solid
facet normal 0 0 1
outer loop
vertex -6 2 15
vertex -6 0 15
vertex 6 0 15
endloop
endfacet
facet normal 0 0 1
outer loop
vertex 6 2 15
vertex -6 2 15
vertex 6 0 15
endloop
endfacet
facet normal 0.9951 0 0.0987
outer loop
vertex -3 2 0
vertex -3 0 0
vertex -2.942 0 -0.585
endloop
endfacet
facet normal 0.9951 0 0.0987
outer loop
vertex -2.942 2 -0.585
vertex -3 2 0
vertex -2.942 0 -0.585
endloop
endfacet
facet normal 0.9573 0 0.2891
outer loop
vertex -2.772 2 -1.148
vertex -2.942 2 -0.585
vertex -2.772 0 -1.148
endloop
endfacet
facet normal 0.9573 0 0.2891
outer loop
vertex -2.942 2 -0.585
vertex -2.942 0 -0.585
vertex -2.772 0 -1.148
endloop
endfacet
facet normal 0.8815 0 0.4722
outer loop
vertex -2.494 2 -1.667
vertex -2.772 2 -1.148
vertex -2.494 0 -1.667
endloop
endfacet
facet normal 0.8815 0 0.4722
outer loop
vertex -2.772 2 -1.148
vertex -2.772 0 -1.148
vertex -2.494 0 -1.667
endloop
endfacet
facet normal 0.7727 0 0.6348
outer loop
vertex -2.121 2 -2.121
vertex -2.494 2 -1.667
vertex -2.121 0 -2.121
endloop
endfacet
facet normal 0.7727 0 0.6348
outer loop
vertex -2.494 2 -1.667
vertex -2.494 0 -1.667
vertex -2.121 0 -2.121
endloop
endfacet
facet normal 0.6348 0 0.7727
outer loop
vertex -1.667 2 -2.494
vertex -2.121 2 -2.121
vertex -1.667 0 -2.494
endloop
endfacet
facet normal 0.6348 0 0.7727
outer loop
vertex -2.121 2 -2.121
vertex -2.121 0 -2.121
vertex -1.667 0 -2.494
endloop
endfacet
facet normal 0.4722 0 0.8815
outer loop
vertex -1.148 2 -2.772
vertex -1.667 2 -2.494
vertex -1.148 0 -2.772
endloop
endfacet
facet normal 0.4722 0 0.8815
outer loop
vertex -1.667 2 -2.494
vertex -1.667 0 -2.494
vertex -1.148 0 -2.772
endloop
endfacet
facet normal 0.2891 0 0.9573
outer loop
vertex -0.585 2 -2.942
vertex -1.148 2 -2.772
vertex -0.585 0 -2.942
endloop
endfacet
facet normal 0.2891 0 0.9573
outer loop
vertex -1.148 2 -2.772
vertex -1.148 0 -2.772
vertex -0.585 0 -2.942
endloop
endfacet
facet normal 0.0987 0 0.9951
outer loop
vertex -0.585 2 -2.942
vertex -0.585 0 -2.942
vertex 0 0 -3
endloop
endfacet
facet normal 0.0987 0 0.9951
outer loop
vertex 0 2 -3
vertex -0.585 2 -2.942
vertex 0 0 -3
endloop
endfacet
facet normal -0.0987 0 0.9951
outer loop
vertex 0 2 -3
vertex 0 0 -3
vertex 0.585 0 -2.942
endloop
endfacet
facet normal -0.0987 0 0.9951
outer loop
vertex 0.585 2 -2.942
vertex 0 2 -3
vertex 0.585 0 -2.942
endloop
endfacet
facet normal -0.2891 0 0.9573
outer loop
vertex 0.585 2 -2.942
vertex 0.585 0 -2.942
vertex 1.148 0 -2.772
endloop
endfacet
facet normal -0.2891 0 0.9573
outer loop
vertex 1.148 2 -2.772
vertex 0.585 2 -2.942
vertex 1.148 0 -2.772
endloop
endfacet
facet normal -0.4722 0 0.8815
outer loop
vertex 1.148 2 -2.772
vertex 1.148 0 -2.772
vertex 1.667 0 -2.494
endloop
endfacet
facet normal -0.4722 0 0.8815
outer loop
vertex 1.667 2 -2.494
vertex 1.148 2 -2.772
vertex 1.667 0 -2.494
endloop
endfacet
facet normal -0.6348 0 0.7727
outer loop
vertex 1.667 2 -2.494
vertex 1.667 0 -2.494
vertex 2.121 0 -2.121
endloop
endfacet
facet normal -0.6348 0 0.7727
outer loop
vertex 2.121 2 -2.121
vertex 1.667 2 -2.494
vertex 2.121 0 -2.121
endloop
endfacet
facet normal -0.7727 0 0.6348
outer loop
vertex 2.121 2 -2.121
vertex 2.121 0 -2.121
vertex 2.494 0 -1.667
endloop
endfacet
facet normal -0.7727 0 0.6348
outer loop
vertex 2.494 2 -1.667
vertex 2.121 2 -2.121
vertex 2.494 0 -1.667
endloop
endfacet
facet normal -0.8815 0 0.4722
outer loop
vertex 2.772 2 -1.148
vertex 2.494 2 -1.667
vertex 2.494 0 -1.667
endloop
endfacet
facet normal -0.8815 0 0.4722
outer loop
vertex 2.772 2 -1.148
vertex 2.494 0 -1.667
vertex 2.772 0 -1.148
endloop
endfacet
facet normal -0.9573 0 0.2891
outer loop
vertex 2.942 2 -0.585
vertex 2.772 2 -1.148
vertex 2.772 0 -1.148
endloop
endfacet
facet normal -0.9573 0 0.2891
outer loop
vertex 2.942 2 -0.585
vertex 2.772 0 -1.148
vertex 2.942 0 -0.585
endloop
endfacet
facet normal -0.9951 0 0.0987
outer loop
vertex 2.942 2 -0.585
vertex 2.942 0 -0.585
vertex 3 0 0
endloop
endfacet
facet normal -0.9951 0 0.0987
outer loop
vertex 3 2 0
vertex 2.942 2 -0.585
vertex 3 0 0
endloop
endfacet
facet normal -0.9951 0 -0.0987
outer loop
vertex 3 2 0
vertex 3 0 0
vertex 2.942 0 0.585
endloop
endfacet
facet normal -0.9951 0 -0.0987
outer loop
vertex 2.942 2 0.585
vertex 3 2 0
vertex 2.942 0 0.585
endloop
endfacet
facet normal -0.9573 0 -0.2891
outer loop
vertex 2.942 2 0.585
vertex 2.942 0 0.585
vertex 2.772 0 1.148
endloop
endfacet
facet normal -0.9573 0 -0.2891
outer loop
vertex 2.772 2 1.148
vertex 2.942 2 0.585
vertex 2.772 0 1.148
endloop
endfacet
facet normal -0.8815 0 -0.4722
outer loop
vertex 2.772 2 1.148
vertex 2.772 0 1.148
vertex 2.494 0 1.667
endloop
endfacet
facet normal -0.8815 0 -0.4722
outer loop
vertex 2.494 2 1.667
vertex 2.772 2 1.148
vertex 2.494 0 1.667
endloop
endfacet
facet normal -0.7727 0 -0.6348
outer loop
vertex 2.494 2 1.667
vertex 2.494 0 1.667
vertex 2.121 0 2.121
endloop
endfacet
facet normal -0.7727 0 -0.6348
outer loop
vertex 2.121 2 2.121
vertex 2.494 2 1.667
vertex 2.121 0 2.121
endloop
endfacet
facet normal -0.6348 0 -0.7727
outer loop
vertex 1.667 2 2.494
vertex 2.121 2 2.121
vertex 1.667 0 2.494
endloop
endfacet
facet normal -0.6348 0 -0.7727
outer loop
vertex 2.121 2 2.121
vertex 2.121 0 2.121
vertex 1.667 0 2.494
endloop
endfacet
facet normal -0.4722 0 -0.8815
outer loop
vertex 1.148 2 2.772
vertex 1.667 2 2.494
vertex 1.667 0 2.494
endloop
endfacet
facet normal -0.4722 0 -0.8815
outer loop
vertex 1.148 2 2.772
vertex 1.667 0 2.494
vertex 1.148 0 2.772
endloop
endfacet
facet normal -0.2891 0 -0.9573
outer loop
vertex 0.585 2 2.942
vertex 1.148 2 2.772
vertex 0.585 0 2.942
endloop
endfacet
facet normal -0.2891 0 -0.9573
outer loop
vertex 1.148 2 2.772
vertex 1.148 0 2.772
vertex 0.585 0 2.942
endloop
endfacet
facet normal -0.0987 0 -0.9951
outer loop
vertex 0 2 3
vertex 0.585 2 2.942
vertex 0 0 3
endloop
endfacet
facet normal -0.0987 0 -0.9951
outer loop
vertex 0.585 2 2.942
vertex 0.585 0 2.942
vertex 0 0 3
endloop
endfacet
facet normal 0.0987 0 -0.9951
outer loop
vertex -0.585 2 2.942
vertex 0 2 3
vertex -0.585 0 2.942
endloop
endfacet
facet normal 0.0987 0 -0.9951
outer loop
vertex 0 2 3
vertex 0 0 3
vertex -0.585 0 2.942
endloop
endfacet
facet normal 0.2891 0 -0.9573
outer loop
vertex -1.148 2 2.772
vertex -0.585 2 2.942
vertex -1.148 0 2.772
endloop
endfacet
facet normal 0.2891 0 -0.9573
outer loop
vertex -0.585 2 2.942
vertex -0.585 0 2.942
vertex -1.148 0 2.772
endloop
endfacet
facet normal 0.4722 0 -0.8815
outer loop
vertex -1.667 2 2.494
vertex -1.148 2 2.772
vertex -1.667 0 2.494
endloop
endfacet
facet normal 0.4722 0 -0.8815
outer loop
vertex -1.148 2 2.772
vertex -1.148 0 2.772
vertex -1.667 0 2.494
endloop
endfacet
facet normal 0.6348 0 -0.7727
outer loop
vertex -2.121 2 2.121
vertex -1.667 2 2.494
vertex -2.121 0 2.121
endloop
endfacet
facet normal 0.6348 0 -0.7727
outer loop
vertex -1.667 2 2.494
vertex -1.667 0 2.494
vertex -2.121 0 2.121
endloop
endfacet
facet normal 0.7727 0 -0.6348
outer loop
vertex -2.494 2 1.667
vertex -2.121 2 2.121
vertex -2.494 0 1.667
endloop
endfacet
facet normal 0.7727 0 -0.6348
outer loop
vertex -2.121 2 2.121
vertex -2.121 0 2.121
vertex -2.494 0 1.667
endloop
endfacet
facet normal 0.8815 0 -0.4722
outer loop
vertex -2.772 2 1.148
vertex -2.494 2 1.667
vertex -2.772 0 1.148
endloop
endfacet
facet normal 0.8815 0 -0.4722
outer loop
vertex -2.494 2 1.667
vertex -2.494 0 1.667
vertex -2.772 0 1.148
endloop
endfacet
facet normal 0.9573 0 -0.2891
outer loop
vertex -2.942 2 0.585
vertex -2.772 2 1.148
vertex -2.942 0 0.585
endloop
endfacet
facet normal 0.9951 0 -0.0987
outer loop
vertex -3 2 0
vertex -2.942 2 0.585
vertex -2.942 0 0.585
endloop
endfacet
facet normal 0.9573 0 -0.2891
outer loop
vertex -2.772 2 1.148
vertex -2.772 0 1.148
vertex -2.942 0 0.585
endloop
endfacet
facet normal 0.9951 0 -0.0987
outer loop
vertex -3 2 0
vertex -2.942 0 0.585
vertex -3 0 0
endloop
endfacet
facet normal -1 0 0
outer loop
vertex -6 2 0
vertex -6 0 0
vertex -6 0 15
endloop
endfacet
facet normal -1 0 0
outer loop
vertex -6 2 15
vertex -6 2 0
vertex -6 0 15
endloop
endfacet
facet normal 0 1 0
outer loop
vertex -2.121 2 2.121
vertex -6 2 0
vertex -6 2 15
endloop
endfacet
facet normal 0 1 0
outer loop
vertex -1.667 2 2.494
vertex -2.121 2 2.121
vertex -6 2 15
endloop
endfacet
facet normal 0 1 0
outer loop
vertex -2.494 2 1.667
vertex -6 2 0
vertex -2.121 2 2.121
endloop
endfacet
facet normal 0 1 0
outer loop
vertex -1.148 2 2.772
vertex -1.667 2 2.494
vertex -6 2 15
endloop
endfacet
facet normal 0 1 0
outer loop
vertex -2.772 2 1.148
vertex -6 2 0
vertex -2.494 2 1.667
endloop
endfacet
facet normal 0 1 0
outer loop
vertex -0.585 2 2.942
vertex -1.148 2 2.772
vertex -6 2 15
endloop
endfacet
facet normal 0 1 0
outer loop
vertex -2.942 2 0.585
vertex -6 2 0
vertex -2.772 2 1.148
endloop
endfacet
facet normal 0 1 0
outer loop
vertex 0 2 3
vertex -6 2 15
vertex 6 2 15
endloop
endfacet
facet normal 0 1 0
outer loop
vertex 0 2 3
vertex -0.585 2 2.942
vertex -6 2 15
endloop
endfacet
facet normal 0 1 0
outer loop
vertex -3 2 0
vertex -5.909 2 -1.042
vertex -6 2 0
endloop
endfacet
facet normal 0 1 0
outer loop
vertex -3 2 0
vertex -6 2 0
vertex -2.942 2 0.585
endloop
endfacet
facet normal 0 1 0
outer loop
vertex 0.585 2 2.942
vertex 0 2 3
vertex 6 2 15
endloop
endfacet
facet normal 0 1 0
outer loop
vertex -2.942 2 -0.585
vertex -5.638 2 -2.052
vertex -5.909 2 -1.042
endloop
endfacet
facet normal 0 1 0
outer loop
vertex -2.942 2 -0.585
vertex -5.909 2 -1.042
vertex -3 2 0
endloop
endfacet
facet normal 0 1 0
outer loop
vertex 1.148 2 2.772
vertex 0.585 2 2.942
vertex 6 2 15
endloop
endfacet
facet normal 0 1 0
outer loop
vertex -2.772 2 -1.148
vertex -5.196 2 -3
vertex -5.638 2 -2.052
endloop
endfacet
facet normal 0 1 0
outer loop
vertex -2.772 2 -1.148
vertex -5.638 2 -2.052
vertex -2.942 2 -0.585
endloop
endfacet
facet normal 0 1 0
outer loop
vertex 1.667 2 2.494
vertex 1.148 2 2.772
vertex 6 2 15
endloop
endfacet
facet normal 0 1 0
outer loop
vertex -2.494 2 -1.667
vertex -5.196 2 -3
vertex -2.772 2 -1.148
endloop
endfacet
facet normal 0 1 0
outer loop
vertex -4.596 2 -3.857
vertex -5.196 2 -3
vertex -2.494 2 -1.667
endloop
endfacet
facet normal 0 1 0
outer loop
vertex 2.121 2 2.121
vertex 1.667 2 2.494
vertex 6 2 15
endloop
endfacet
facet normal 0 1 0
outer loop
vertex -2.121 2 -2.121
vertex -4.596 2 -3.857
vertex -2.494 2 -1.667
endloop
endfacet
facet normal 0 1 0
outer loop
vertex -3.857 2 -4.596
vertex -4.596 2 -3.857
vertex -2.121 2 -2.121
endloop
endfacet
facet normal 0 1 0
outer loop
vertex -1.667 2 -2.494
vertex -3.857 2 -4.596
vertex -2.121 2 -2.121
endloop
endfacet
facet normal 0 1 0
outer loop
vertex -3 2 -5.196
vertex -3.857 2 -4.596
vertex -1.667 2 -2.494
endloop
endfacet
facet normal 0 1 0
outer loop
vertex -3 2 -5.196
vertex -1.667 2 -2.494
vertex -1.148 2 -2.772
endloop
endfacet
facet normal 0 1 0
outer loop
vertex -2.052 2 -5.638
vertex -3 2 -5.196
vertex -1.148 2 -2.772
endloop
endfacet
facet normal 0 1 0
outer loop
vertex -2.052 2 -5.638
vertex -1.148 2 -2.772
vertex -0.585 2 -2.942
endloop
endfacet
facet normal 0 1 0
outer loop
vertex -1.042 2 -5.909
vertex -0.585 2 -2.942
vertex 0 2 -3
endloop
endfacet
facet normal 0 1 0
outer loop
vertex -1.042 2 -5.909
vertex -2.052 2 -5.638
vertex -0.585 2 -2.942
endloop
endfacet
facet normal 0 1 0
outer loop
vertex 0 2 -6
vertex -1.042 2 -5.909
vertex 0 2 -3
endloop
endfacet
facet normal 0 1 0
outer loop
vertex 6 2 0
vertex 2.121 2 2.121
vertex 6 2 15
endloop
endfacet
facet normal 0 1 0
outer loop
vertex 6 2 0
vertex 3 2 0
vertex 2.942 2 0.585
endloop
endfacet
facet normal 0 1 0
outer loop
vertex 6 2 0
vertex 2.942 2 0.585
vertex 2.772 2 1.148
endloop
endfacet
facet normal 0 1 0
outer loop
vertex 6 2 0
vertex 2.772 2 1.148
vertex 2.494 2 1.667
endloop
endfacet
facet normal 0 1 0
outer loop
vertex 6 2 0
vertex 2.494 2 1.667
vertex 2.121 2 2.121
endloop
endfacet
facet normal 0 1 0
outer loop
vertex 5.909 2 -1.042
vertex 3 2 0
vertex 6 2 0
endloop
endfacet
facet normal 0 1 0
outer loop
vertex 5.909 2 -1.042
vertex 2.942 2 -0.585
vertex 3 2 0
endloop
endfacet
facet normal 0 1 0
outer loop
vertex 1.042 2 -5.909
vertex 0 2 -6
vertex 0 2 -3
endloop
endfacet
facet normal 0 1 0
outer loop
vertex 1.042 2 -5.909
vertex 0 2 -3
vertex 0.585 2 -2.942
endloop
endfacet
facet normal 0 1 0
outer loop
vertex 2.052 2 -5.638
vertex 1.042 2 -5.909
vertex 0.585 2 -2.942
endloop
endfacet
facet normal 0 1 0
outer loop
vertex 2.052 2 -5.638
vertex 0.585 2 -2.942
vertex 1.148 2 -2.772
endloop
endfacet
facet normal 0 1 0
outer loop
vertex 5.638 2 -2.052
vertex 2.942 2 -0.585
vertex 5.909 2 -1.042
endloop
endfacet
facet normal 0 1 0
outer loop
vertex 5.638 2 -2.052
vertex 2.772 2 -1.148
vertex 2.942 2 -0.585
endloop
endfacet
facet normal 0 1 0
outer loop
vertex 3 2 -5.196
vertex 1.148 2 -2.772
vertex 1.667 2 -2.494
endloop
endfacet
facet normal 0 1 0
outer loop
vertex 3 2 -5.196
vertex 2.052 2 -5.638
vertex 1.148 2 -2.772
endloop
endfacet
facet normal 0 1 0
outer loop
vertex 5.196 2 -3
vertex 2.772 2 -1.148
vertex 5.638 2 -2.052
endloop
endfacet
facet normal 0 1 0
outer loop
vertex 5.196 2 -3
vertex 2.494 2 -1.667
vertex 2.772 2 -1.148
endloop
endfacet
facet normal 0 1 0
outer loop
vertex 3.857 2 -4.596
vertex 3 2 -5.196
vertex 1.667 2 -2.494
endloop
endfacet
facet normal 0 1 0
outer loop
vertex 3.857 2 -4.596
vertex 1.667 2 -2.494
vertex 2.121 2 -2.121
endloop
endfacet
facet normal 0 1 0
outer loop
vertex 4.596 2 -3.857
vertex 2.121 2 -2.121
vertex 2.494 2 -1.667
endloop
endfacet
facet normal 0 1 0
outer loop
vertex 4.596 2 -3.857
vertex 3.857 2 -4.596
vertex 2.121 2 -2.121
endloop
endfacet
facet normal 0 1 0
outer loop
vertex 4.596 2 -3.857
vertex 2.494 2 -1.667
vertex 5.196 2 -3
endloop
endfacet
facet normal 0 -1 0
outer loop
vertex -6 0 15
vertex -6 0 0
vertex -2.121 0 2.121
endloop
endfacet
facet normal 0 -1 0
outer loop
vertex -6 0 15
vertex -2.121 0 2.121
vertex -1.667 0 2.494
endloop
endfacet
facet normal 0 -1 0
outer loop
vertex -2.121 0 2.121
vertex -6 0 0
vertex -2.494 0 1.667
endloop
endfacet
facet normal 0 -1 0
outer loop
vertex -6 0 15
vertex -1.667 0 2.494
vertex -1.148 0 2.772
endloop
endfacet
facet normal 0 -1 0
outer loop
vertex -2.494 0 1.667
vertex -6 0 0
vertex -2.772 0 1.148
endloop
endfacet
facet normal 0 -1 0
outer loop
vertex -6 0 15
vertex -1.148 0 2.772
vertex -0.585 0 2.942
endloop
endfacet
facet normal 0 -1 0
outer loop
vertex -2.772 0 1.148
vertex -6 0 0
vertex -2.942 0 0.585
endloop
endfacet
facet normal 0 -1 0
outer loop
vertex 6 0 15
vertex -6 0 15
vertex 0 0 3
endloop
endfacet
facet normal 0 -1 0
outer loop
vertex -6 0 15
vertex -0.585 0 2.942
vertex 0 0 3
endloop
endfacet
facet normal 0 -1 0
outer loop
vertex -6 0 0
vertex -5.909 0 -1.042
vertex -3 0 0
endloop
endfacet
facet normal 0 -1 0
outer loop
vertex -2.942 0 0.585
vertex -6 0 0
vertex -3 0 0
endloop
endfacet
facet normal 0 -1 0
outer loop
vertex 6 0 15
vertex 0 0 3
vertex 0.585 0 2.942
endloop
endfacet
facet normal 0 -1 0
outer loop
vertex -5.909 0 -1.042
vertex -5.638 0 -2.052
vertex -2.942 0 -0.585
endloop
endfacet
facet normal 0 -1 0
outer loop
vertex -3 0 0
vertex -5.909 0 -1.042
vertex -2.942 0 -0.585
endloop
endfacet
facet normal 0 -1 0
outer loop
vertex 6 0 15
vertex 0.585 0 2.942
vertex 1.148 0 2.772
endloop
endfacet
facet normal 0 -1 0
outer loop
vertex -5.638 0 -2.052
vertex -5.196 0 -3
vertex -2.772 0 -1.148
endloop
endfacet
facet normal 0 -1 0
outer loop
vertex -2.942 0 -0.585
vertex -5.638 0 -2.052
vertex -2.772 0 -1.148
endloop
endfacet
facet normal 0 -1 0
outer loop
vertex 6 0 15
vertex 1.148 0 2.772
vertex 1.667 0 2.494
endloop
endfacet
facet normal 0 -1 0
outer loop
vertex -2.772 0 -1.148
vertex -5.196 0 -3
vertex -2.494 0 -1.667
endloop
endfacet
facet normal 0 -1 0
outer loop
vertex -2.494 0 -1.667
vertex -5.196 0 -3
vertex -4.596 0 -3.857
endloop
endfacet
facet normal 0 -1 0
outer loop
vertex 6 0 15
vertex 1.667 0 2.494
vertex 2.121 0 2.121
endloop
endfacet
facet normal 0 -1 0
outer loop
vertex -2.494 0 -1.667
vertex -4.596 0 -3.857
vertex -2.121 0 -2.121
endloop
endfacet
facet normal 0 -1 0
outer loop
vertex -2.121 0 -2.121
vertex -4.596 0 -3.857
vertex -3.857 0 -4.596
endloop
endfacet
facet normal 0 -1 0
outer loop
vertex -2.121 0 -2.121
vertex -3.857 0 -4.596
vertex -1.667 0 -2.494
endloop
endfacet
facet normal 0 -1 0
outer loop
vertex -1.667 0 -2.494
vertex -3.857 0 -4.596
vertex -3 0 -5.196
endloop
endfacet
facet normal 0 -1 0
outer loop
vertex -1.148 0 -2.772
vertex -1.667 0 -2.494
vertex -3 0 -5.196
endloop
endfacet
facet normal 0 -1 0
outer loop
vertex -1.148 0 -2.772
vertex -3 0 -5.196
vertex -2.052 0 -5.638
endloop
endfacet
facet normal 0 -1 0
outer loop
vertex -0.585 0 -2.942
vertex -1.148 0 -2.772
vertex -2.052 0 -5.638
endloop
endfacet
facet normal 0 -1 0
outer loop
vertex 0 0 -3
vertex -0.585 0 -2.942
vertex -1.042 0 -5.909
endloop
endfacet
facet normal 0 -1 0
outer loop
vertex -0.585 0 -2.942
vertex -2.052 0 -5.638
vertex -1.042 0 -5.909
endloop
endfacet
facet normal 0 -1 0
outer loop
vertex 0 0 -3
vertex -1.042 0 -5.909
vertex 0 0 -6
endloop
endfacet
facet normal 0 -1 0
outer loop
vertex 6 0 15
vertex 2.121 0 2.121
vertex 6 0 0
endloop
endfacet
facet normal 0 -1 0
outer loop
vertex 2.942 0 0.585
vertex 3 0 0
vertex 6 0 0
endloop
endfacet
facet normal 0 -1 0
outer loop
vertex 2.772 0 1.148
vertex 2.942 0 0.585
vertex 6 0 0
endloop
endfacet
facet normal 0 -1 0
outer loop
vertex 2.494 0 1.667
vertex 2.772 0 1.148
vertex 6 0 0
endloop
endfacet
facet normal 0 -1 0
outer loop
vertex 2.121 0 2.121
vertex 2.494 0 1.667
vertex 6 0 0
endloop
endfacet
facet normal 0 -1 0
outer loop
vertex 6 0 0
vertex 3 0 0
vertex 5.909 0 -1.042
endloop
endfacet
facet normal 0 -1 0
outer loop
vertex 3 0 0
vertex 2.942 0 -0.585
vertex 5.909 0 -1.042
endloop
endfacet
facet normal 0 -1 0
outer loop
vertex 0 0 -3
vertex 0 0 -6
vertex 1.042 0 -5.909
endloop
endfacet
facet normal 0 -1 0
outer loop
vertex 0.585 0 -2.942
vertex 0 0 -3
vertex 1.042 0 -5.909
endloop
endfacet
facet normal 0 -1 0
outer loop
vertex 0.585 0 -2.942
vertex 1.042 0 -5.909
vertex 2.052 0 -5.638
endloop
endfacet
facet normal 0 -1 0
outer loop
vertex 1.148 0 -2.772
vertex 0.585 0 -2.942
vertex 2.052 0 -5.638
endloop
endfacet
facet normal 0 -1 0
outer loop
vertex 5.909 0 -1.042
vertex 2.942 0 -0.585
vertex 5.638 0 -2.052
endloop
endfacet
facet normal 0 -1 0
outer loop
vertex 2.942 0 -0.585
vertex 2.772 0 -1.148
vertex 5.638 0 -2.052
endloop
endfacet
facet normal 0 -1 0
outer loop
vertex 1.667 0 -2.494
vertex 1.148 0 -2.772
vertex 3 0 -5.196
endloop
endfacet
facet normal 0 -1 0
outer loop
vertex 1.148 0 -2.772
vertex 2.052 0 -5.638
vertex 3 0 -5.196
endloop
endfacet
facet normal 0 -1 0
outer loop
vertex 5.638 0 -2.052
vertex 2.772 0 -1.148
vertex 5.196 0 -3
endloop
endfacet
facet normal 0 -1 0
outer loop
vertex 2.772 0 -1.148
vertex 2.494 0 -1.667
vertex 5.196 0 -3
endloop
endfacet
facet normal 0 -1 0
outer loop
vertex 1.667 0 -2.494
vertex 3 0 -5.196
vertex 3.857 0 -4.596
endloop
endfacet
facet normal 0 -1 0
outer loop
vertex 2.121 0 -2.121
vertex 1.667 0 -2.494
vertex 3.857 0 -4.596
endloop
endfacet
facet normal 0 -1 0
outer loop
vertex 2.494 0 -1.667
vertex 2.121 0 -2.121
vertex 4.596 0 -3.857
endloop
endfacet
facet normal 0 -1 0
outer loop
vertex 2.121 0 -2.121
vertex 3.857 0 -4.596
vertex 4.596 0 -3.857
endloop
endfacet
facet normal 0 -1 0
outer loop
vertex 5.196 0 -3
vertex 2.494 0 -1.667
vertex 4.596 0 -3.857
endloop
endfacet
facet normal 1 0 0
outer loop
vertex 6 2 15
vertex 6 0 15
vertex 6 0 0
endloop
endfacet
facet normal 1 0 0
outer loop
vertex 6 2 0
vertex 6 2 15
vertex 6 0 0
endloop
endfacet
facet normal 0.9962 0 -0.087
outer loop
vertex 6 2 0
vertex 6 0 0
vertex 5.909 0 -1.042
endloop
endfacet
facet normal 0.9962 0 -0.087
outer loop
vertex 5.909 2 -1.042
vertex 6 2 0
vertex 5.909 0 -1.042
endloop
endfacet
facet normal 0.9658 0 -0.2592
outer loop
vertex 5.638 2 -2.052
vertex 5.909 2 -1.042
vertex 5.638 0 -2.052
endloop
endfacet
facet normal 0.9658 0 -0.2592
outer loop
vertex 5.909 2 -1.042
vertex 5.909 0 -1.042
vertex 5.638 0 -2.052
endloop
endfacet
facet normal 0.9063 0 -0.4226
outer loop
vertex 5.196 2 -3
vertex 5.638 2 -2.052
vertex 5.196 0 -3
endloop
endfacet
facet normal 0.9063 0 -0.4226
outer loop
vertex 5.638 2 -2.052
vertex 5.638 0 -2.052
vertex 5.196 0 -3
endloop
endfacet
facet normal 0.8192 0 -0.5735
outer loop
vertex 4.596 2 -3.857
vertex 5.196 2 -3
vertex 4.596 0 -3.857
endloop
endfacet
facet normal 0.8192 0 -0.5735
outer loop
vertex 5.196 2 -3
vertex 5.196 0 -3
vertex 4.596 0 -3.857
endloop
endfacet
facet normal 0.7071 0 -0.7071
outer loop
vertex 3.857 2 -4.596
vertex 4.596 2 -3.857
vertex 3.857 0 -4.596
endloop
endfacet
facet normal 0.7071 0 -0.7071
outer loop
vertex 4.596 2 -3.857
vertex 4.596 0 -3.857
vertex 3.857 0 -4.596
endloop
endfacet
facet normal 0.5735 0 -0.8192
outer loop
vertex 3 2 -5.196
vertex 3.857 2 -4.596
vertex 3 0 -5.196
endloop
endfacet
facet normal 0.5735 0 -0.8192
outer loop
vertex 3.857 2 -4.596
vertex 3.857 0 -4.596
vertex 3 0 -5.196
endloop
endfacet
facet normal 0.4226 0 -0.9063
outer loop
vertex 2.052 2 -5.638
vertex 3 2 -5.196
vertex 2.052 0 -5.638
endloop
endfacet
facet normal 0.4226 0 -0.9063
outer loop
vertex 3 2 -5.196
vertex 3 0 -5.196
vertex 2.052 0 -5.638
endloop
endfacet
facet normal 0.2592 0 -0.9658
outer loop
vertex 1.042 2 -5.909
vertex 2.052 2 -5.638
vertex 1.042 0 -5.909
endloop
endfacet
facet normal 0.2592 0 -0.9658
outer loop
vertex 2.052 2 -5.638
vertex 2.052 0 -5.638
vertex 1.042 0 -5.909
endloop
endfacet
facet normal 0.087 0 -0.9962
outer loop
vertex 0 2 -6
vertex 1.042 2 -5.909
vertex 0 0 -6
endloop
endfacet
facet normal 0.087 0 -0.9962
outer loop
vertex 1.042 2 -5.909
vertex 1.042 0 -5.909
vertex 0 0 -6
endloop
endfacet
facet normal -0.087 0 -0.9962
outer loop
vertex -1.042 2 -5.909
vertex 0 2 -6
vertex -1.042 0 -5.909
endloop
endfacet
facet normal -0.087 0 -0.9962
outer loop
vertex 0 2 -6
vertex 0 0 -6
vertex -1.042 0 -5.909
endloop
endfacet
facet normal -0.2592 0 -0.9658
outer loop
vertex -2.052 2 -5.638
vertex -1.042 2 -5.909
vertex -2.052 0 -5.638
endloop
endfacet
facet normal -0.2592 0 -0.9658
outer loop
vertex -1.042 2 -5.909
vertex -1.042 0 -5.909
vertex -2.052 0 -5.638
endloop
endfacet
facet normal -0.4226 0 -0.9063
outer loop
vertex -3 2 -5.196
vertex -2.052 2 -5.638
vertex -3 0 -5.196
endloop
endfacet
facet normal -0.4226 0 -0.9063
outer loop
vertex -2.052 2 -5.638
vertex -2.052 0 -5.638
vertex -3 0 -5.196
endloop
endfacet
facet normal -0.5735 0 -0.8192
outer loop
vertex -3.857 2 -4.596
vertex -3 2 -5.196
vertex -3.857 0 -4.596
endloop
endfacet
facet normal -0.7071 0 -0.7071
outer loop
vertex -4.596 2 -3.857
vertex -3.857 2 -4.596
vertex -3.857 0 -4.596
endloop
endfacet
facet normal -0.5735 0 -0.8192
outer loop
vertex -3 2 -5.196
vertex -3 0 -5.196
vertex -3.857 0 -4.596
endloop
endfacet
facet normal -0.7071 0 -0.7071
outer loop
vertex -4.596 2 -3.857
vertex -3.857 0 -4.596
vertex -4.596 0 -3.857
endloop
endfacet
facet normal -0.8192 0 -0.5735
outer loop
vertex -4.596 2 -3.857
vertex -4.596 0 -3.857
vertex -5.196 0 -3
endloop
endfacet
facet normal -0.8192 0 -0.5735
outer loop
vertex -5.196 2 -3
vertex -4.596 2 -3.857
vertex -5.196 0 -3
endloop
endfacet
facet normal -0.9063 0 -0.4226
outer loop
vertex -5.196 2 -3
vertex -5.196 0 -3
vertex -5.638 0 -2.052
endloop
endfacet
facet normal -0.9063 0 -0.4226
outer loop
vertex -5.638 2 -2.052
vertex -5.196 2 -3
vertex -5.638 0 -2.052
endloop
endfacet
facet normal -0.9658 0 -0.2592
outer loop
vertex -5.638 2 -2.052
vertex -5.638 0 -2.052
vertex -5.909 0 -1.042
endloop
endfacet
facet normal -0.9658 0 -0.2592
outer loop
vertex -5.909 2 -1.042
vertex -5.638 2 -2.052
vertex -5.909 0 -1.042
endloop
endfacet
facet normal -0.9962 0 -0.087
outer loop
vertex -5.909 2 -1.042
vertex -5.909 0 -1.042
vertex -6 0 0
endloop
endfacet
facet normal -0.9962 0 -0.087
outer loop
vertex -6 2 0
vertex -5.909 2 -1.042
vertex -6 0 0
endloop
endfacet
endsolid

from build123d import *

# Parameters (mm, degrees)
DODANIE_WYCI_GNI_CIE1_DEPTH = 2
OTW_R1_D                    = 6
OTW_R1_DEPTH                = 2


with BuildPart() as part:
    # Szkic1 → Dodanie-wyciągnięcie1 (new body)
    with BuildSketch(Plane(origin=(0, 0, 0), x_dir=(1, 0, 0), z_dir=(0, 1, 0))):
        with BuildLine():
            Line((-6, 0), (-6, -15))
            Line((-6, -15), (6, -15))
            Line((6, -15), (6, 0))
            ThreePointArc((6, 0), (0, 6), (-6, 0))
        make_face()
    extrude(amount=DODANIE_WYCI_GNI_CIE1_DEPTH)

    # Otwór1
    with Locations(Plane(origin=(0, 2, 0), x_dir=(1, 0, 0), z_dir=(0, 1, 0))):
        with Locations((0, 0)):
            Hole(OTW_R1_D / 2, depth=OTW_R1_DEPTH)


solid = part.part
